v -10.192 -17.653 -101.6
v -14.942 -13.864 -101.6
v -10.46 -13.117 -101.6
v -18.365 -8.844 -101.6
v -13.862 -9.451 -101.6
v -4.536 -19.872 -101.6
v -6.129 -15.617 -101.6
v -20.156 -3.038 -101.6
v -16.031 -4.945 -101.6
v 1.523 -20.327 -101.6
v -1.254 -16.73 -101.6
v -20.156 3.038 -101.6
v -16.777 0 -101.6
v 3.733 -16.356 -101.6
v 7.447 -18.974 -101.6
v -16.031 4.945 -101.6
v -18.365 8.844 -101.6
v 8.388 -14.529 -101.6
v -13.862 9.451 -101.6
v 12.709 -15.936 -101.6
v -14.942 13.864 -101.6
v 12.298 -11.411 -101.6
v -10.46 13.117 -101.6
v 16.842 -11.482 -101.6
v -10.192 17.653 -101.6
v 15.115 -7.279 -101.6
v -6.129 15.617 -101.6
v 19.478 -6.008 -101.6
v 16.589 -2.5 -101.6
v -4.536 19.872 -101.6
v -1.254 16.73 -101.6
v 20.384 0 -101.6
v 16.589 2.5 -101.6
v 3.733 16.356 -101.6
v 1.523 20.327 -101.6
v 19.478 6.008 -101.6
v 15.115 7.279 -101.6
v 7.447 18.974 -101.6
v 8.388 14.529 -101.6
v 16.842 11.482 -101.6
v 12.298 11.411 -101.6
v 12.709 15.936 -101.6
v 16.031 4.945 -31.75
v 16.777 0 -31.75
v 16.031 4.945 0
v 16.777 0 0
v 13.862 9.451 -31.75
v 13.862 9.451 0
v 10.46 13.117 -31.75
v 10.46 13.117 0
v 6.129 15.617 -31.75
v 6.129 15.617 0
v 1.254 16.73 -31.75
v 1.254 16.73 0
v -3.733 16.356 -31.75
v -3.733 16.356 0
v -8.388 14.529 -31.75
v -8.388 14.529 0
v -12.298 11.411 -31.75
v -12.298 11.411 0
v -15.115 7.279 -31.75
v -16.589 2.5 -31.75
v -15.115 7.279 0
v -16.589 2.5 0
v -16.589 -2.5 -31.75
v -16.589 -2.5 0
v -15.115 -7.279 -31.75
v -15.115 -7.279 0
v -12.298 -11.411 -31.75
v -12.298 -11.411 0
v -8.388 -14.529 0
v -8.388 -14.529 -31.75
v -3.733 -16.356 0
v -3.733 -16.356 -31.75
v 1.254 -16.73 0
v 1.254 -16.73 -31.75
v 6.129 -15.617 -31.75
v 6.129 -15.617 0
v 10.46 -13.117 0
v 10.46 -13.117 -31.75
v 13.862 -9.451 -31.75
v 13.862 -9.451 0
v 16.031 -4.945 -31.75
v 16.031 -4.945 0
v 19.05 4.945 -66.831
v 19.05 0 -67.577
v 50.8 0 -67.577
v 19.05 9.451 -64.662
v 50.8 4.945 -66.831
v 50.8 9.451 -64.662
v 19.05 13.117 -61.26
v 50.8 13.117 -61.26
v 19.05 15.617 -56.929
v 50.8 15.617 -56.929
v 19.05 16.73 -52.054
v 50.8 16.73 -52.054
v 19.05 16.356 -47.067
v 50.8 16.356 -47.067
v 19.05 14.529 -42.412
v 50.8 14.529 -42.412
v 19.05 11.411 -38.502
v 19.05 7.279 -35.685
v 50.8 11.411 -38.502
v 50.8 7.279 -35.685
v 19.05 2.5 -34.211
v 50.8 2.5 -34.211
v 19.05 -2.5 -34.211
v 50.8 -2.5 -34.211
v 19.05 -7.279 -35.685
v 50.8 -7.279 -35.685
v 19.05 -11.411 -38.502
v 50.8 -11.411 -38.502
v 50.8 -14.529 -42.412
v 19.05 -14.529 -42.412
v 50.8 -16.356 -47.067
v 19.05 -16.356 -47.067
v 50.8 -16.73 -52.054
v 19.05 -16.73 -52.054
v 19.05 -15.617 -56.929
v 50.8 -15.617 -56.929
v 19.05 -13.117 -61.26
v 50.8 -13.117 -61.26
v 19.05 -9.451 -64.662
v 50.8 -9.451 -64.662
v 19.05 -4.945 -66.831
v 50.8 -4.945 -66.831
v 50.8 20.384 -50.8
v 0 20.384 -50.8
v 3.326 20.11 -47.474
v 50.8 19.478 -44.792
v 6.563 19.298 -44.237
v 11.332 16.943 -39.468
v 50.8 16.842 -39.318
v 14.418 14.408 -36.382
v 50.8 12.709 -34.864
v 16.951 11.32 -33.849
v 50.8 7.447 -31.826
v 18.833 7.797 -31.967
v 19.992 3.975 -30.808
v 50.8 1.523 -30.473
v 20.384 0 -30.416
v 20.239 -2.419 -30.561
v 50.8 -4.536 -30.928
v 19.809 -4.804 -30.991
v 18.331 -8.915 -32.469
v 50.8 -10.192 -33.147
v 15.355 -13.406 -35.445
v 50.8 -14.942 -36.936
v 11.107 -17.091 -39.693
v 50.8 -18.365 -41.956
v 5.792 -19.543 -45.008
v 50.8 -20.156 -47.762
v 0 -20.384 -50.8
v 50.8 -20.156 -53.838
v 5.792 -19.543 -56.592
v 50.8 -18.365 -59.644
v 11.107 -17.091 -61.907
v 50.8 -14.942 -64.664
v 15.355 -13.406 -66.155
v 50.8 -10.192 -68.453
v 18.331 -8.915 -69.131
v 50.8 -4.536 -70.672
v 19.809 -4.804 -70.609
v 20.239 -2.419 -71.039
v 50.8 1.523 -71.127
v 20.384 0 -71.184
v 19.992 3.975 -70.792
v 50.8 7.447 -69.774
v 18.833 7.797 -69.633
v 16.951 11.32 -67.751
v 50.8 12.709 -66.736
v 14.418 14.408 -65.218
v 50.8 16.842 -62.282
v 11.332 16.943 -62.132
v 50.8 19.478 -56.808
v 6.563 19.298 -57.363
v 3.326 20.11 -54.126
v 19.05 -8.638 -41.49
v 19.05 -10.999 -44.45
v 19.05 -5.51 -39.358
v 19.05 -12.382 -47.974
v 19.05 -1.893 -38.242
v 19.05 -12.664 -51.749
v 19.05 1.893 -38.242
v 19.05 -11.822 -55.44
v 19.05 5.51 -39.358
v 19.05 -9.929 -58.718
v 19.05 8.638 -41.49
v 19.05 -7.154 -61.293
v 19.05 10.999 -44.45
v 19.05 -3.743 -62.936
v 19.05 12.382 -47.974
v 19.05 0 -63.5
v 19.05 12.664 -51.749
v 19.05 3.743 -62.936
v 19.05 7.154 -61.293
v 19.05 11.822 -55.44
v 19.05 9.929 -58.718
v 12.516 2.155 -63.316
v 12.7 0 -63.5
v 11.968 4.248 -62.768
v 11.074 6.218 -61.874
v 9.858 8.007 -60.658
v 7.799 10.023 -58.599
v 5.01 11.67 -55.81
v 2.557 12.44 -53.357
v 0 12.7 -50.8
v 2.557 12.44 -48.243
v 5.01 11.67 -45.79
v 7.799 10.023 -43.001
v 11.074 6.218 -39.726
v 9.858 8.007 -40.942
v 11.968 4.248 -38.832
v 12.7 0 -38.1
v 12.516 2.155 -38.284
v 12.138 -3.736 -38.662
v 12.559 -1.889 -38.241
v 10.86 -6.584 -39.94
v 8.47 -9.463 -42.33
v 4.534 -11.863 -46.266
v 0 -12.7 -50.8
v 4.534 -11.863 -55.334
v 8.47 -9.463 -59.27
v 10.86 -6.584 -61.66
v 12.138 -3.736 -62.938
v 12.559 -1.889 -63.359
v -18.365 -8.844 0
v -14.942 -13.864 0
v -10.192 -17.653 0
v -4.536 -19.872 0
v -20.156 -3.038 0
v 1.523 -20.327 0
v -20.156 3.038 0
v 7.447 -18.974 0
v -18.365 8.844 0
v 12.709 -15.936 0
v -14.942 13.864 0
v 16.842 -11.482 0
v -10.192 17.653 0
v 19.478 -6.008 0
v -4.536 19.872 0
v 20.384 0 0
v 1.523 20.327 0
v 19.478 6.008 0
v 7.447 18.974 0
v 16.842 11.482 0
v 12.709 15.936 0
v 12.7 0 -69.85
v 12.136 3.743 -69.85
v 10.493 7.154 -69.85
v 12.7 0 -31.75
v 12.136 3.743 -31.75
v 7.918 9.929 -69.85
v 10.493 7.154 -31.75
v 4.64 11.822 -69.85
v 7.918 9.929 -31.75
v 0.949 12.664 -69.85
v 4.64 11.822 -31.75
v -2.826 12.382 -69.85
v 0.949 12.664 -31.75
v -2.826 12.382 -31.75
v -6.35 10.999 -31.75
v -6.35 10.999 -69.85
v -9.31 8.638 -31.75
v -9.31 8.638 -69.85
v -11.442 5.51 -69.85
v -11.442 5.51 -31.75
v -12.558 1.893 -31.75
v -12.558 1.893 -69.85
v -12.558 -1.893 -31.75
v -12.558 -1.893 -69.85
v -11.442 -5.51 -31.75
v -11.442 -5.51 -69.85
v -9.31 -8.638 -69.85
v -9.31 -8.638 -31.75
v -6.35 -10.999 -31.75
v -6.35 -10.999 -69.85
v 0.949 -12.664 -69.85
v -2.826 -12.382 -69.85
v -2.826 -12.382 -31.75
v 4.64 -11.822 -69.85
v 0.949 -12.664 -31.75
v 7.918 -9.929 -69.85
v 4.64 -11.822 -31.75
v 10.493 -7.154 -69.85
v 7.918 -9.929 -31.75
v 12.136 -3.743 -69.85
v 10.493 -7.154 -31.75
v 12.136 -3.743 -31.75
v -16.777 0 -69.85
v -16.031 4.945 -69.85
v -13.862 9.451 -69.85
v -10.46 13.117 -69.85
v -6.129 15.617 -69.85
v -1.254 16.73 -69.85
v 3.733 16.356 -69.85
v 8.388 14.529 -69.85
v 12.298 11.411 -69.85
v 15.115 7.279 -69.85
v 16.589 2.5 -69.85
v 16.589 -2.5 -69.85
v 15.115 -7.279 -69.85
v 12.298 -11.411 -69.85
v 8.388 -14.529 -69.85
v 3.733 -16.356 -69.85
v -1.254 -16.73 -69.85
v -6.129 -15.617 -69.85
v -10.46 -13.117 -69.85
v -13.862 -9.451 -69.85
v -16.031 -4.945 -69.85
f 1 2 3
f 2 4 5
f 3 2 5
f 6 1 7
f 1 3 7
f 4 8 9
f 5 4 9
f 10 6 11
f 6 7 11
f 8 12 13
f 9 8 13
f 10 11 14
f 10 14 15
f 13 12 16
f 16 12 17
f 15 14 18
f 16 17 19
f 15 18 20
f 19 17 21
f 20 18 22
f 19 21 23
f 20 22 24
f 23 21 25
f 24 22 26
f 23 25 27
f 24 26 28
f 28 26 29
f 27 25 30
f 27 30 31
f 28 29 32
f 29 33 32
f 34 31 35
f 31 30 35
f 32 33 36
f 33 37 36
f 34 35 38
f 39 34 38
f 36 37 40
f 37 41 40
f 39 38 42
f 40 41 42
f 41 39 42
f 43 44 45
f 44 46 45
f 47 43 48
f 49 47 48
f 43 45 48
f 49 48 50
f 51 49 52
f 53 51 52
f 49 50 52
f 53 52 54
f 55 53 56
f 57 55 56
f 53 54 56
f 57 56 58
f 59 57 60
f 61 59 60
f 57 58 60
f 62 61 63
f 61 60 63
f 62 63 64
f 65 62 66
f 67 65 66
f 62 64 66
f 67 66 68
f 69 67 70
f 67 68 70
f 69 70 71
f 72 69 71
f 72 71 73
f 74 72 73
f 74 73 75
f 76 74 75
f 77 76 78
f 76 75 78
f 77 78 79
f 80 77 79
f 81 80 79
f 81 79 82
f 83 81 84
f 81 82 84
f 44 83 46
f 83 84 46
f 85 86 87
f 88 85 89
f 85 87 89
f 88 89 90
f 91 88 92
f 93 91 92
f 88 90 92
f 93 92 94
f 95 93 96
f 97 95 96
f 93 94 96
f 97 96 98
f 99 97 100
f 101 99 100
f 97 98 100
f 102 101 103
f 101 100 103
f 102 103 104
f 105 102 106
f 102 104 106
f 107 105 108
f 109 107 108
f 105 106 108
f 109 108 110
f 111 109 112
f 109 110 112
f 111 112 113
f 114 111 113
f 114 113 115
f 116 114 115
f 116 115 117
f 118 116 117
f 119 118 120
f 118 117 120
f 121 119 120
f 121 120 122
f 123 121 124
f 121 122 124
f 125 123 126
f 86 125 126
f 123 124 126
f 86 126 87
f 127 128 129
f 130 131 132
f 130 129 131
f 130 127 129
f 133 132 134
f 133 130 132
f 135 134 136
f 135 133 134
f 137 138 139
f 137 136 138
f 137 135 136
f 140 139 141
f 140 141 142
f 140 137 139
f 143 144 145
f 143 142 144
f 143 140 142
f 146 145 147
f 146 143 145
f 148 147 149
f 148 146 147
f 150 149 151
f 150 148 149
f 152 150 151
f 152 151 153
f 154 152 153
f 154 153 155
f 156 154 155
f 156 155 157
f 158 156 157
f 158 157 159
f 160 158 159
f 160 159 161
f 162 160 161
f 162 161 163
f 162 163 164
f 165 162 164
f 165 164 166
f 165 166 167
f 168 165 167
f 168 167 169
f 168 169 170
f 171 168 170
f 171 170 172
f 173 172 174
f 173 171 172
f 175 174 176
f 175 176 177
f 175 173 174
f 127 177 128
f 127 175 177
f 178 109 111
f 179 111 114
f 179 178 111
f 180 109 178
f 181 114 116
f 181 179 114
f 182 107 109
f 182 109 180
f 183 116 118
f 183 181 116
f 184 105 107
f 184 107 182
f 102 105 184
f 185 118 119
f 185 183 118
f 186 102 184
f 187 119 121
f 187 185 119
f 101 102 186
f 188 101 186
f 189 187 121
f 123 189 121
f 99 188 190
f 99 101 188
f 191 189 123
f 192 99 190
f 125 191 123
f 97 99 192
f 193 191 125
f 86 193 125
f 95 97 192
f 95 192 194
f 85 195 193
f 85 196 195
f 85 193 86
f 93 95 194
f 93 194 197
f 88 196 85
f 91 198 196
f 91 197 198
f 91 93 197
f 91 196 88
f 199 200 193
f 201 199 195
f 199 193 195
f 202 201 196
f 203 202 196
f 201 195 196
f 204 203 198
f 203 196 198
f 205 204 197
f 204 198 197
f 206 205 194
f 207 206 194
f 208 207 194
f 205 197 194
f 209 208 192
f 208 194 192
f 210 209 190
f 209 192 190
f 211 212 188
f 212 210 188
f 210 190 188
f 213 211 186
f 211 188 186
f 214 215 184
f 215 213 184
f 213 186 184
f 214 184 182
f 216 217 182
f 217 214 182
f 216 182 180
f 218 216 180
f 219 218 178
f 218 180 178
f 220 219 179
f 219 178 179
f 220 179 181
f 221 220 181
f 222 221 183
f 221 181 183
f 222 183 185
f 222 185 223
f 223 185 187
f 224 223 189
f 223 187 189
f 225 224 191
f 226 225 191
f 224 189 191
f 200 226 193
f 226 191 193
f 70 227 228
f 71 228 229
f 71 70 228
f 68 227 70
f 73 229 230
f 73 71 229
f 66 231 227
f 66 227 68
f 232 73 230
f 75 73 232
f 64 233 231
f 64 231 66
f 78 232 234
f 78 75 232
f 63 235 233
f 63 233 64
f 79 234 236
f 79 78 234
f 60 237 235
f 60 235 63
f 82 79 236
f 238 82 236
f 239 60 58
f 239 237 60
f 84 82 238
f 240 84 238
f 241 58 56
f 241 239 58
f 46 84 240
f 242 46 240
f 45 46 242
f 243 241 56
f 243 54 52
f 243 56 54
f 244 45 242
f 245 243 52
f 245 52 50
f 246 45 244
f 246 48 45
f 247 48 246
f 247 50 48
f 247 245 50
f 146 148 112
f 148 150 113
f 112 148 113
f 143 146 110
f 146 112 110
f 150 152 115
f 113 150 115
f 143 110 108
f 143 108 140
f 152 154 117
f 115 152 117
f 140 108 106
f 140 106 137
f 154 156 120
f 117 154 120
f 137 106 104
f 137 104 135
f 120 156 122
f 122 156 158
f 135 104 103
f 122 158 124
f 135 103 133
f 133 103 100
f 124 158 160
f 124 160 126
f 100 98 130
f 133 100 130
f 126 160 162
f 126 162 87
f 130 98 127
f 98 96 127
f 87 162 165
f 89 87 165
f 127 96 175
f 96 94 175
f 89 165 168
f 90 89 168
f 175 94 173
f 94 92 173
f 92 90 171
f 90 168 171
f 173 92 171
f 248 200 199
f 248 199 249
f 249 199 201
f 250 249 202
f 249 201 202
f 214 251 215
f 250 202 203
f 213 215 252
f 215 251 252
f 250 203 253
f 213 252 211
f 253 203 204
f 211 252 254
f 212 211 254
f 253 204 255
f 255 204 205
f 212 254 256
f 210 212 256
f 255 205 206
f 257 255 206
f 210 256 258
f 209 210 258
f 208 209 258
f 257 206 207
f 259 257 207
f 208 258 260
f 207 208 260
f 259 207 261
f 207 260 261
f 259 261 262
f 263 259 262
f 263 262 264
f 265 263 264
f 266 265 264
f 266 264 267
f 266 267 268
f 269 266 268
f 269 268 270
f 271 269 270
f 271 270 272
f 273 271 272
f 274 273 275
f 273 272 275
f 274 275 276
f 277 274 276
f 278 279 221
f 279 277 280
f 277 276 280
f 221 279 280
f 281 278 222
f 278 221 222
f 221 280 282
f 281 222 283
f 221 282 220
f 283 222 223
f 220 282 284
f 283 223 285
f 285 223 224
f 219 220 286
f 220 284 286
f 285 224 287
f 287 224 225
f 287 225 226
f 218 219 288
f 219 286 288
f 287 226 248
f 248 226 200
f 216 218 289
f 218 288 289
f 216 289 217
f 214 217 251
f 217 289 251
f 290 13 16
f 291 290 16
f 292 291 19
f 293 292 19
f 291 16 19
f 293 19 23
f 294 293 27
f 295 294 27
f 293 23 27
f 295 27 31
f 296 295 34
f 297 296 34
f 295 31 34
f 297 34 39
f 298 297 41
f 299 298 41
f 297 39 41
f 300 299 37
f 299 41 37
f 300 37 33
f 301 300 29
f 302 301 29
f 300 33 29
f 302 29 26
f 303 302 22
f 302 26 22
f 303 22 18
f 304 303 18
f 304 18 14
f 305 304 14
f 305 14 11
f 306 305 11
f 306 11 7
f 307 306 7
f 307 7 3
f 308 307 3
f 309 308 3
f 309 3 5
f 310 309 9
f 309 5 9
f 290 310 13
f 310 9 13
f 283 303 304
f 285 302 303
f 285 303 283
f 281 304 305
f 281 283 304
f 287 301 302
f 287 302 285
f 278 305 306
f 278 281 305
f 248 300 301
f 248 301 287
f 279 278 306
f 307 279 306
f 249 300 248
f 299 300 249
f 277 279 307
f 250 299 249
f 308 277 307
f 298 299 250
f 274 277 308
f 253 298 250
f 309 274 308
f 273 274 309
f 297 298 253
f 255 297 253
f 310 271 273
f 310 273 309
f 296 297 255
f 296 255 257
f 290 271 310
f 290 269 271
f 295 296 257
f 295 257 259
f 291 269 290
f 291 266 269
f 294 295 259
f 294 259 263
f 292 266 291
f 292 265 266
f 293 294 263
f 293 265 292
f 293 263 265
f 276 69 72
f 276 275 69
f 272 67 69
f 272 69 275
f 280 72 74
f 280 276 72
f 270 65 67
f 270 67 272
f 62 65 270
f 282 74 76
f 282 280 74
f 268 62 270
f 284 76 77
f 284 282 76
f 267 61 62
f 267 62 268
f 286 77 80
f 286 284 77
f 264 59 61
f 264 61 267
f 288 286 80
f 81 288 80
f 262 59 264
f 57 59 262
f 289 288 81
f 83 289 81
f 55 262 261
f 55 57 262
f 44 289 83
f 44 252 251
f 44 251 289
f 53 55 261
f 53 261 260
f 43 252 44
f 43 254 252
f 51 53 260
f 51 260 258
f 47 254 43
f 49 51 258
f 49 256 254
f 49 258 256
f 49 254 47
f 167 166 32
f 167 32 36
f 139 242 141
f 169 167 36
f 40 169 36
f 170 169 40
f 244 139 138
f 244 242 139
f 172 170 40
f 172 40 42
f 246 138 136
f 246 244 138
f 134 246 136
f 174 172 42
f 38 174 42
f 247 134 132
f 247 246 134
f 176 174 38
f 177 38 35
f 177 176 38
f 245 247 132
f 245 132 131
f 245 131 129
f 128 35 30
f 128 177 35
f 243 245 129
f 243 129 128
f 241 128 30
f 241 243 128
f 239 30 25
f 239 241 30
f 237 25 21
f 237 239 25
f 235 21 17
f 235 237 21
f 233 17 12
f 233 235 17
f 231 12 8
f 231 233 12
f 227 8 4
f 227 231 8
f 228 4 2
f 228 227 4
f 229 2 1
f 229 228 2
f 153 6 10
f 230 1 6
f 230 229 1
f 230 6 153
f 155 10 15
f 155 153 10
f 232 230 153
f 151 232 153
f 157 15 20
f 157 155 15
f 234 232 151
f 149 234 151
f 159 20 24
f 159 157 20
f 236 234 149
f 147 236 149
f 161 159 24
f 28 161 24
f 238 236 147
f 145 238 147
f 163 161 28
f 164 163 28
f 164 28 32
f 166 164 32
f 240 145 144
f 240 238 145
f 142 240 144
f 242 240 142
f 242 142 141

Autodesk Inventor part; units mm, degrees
ref_plane "YZ Plane" through (0, 0, 0) normal (1, 0, 0) x (0, 1, 0)
ref_plane "XZ Plane" through (0, 0, 0) normal (0, 1, 0) x (-1, 0, 0)
sketch "Sketch1" plane through (0, 0, 0) normal (0, 0, 1) x (1, 0, 0)
  circle A0 centre (0, 0) radius 20.3835
  dimension "d0" = 40.767
extrude "Extrusion1" add sketch "Sketch1" against normal blind 101.6
sketch "Sketch2" plane through (0, 0, 0) normal (0, 0, 1) x (1, 0, 0)
  circle A0 centre (0, 0) radius 20.3835 projected
  line L0 (20.3835, 0) -> (20.3835, 20.3835)
sketch "Sketch3" plane through (0, 0, -101.6) normal (0, 0, -1) x (-1, 0, 0)
  circle A0 centre (0, 0) radius 20.3835 projected
  line L0 (-20.3835, 0) -> (-20.3835, 20.3835)
ref_plane "Work Plane1" through (20.3835, 0, 0) normal (-1, 0, 0) x (0, 1, 0)
sketch "Sketch4" plane through (20.3835, 0, 0) normal (-1, 0, 0) x (0, 1, 0)
  line L0 (20.3835, 101.6) -> (-20.3835, 101.6) projected
  circle A0 centre (0, 50.8) radius 20.3835
  line L1 (-20.3835, 0) -> (-20.3835, 101.6) projected
  point P0 (0, 0)
extrude "Extrusion2" add sketch "Sketch4" against normal blind 30.4165
extrude "Extrusion3" add sketch "Sketch4" along normal blind 20.3835
sketch "Sketch5" plane through (0, 0, 0) normal (0, 0, 1) x (1, 0, 0)
  circle A0 centre (0, 0) radius 16.7767
  dimension "d7" = 33.5534
sketch "Sketch6" plane through (0, 0, 0) normal (0, 0, 1) x (1, 0, 0)
  circle A0 centre (0, 0) radius 12.7
  dimension "d8" = 25.4
sketch "Sketch7" plane through (50.8, 0, -50.8) normal (1, 0, 0) x (0, 0, -1)
  circle A0 centre (0, 0) radius 16.7767
  point P0 (-50.8, 0)
  dimension "d9" = 33.5534
sketch "Sketch8" plane through (50.8, 0, -50.8) normal (1, 0, 0) x (0, 0, -1)
  circle A0 centre (0, 0) radius 12.7
  point P0 (-50.8, 0)
  dimension "d10" = 25.4
sketch "Sketch9" plane through (0, 0, -101.6) normal (0, 0, -1) x (-1, 0, 0)
  circle A0 centre (0, 0) radius 16.7767
  dimension "d11" = 33.5534
extrude "Extrusion4" cut sketch "Sketch9" against normal blind 31.75
extrude "Extrusion5" cut sketch "Sketch7" against normal blind 31.75
extrude "Extrusion6" cut sketch "Sketch5" against normal blind 31.75
extrude "Extrusion7" cut sketch "Sketch6" against normal blind 101.6
extrude "Extrusion8" cut sketch "Sketch8" against normal blind 50.8
properties part number "Tee 1 Inch"
